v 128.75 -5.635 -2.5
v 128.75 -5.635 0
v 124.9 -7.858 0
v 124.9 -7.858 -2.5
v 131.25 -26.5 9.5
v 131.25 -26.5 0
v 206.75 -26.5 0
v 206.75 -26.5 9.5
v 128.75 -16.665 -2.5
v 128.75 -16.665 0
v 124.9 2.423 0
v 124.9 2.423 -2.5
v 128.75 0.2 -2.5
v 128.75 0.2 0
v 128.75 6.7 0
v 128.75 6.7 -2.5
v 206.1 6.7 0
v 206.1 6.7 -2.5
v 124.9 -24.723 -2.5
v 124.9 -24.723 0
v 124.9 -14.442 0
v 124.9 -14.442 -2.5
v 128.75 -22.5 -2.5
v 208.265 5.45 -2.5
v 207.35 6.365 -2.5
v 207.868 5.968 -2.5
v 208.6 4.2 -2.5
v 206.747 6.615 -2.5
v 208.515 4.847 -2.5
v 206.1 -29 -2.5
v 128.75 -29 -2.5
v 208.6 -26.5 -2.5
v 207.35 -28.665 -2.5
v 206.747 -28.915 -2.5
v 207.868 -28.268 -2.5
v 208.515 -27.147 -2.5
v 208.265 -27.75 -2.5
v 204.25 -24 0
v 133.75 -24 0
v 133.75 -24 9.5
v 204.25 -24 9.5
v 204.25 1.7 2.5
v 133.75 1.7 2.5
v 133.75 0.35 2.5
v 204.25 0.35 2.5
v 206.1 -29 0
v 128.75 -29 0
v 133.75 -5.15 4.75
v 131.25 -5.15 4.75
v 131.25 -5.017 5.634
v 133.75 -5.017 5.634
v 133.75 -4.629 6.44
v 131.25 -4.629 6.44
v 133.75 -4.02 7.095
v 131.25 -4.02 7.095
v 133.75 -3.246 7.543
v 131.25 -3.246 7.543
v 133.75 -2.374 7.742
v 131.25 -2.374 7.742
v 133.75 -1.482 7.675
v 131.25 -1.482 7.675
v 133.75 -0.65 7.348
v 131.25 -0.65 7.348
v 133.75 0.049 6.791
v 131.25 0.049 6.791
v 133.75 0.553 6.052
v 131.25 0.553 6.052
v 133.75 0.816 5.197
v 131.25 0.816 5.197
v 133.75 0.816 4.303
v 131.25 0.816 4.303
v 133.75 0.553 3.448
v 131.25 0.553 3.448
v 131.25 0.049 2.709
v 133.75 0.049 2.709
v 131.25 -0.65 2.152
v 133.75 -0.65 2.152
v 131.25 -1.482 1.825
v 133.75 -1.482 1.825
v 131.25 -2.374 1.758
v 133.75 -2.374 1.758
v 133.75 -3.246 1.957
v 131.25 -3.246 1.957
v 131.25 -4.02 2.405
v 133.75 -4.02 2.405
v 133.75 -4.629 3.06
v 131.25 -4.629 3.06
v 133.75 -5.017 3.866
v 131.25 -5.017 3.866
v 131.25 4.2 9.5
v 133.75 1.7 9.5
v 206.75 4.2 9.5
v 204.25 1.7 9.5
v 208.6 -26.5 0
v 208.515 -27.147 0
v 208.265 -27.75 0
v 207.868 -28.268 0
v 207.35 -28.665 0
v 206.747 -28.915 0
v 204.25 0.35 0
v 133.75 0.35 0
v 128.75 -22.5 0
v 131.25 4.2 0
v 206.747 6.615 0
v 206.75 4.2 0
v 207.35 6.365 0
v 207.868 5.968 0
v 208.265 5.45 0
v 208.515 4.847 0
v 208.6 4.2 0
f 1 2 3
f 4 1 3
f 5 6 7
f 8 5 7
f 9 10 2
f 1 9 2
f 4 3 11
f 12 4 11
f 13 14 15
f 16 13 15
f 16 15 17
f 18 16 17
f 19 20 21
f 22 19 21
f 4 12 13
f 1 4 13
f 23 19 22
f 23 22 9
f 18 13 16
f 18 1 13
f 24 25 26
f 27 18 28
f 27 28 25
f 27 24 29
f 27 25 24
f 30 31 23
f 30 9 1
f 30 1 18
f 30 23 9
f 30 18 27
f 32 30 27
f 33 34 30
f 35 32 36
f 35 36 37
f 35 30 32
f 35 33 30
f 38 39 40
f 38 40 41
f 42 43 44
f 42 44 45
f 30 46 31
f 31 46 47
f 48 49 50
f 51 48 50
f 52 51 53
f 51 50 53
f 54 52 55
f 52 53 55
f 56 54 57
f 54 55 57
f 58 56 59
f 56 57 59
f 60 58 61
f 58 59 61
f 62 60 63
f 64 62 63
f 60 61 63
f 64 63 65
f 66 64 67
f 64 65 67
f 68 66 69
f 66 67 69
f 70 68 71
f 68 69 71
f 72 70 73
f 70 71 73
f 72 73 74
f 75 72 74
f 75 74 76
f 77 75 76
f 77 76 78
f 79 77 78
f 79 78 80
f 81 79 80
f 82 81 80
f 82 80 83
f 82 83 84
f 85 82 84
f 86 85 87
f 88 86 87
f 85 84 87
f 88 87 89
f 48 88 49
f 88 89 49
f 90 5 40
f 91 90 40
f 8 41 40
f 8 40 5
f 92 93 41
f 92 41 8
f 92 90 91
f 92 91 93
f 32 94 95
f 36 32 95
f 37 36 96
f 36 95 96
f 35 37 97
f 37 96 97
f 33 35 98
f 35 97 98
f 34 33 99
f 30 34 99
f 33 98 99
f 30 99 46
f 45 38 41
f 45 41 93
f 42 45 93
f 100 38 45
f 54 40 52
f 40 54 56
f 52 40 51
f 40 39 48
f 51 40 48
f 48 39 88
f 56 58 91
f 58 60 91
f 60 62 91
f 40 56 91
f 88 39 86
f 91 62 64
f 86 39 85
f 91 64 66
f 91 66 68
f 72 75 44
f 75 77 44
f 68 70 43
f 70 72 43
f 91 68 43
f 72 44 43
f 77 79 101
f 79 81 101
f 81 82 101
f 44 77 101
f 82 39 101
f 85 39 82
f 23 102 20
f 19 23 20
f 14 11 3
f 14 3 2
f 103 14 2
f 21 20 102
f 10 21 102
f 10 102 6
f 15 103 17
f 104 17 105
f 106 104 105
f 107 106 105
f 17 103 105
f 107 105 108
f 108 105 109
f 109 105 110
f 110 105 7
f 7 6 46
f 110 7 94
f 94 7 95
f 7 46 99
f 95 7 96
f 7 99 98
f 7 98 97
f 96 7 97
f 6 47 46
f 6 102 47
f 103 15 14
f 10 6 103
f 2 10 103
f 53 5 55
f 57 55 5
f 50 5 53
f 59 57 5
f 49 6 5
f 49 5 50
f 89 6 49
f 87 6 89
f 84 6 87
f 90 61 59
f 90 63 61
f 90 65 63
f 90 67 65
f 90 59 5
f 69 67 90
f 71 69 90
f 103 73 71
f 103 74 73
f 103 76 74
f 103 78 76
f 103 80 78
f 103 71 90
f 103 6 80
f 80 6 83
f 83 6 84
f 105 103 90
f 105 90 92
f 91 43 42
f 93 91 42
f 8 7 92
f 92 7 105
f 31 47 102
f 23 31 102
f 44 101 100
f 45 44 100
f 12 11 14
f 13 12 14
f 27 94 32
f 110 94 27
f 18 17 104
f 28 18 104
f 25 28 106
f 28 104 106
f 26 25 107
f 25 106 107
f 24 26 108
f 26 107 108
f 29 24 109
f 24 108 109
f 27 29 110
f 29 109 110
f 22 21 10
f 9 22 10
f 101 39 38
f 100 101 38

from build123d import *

# Parameters (mm, degrees)
SKETCH048_W     = 70.5
SKETCH048_H     = 25.7
PAD041_DEPTH    = 9.5
THICKNESS005_T  = 2.5
SKETCH049_R     = 3
POCKET011_DEPTH = 2.5
SKETCH050_W     = 70.5
SKETCH050_H     = 1.5
PAD042_DEPTH    = 2.5
PAD040_DEPTH    = 2.5


with BuildPart() as body014:
    # Sketch048 → Pad041 (new body)
    with BuildSketch(Plane.XY):
        with Locations((0, -48)):
            Rectangle(SKETCH048_W, SKETCH048_H)
    extrude(amount=PAD041_DEPTH)

    # Thickness005
    thickness005_openings = [body014.faces().sort_by_distance(p)[0] for p in [
        (0, -48, 9.5),
        (0, -48, 0),
    ]]
    offset(amount=THICKNESS005_T, openings=thickness005_openings, kind=Kind.INTERSECTION)

    # Sketch049 (on Face6 of Thickness005) → Pocket011 (cut)
    with BuildSketch(Plane(origin=(-37.75, 0, 0), x_dir=(0, -1, 0), z_dir=(-1, 0, 0))):
        with Locations((39, 4.75)):
            Circle(SKETCH049_R)
    extrude(amount=-POCKET011_DEPTH, mode=Mode.SUBTRACT)

    # Sketch050 → Pad042 (join)
    with BuildSketch(Plane.XY):
        with Locations((0, -35.75)):
            Rectangle(SKETCH050_W, SKETCH050_H)
    extrude(amount=PAD042_DEPTH)


with BuildPart() as body014_1:
    # Body014 placement: moved
    add(body014.part.moved(Location((84.5, 36.85, 0))))


with BuildPart() as tail:
    # Sketch047 → Pad040 (new body)
    with BuildSketch(Plane(origin=(0, 0, 0), x_dir=(1, 0, 0), z_dir=(0, 0, -1))):
        with BuildLine():
            Line((-40.250166, 30.15), (37.1, 30.15))
            ThreePointArc((37.1, 30.15), (38.867767, 30.882233), (39.6, 32.65))
            Line((39.6, 63.35), (39.6, 32.65))
            ThreePointArc((39.6, 63.35), (38.867767, 65.117767), (37.1, 65.85))
            Line((37.1, 65.85), (-40.25, 65.85))
            Line((-40.25, 65.85), (-40.25, 59.35))
            Line((-40.25, 59.35), (-44.1, 61.572799))
            Line((-44.1, 61.572799), (-44.1, 51.292346))
            Line((-44.1, 51.292346), (-40.25, 53.515144))
            Line((-40.25, 53.515144), (-40.25, 42.485144))
            Line((-40.25, 42.485144), (-44.100166, 44.707654))
            Line((-44.100166, 44.707654), (-44.100166, 34.427201))
            Line((-44.100166, 34.427201), (-40.250166, 36.65))
            Line((-40.250166, 36.65), (-40.250166, 30.15))
        make_face()
    extrude(amount=PAD040_DEPTH)


with BuildPart() as tail_1:
    # Body013 placement: moved
    add(tail.part.moved(Location((84.5, 36.85, 0))))

    # Fusion004: union Body014
    add(body014_1.part)


with BuildPart() as tail_2:
    # Fusion004 placement: moved
    add(tail_1.part.moved(Location((84.5, 0, 0))))


solid = tail_2.part
